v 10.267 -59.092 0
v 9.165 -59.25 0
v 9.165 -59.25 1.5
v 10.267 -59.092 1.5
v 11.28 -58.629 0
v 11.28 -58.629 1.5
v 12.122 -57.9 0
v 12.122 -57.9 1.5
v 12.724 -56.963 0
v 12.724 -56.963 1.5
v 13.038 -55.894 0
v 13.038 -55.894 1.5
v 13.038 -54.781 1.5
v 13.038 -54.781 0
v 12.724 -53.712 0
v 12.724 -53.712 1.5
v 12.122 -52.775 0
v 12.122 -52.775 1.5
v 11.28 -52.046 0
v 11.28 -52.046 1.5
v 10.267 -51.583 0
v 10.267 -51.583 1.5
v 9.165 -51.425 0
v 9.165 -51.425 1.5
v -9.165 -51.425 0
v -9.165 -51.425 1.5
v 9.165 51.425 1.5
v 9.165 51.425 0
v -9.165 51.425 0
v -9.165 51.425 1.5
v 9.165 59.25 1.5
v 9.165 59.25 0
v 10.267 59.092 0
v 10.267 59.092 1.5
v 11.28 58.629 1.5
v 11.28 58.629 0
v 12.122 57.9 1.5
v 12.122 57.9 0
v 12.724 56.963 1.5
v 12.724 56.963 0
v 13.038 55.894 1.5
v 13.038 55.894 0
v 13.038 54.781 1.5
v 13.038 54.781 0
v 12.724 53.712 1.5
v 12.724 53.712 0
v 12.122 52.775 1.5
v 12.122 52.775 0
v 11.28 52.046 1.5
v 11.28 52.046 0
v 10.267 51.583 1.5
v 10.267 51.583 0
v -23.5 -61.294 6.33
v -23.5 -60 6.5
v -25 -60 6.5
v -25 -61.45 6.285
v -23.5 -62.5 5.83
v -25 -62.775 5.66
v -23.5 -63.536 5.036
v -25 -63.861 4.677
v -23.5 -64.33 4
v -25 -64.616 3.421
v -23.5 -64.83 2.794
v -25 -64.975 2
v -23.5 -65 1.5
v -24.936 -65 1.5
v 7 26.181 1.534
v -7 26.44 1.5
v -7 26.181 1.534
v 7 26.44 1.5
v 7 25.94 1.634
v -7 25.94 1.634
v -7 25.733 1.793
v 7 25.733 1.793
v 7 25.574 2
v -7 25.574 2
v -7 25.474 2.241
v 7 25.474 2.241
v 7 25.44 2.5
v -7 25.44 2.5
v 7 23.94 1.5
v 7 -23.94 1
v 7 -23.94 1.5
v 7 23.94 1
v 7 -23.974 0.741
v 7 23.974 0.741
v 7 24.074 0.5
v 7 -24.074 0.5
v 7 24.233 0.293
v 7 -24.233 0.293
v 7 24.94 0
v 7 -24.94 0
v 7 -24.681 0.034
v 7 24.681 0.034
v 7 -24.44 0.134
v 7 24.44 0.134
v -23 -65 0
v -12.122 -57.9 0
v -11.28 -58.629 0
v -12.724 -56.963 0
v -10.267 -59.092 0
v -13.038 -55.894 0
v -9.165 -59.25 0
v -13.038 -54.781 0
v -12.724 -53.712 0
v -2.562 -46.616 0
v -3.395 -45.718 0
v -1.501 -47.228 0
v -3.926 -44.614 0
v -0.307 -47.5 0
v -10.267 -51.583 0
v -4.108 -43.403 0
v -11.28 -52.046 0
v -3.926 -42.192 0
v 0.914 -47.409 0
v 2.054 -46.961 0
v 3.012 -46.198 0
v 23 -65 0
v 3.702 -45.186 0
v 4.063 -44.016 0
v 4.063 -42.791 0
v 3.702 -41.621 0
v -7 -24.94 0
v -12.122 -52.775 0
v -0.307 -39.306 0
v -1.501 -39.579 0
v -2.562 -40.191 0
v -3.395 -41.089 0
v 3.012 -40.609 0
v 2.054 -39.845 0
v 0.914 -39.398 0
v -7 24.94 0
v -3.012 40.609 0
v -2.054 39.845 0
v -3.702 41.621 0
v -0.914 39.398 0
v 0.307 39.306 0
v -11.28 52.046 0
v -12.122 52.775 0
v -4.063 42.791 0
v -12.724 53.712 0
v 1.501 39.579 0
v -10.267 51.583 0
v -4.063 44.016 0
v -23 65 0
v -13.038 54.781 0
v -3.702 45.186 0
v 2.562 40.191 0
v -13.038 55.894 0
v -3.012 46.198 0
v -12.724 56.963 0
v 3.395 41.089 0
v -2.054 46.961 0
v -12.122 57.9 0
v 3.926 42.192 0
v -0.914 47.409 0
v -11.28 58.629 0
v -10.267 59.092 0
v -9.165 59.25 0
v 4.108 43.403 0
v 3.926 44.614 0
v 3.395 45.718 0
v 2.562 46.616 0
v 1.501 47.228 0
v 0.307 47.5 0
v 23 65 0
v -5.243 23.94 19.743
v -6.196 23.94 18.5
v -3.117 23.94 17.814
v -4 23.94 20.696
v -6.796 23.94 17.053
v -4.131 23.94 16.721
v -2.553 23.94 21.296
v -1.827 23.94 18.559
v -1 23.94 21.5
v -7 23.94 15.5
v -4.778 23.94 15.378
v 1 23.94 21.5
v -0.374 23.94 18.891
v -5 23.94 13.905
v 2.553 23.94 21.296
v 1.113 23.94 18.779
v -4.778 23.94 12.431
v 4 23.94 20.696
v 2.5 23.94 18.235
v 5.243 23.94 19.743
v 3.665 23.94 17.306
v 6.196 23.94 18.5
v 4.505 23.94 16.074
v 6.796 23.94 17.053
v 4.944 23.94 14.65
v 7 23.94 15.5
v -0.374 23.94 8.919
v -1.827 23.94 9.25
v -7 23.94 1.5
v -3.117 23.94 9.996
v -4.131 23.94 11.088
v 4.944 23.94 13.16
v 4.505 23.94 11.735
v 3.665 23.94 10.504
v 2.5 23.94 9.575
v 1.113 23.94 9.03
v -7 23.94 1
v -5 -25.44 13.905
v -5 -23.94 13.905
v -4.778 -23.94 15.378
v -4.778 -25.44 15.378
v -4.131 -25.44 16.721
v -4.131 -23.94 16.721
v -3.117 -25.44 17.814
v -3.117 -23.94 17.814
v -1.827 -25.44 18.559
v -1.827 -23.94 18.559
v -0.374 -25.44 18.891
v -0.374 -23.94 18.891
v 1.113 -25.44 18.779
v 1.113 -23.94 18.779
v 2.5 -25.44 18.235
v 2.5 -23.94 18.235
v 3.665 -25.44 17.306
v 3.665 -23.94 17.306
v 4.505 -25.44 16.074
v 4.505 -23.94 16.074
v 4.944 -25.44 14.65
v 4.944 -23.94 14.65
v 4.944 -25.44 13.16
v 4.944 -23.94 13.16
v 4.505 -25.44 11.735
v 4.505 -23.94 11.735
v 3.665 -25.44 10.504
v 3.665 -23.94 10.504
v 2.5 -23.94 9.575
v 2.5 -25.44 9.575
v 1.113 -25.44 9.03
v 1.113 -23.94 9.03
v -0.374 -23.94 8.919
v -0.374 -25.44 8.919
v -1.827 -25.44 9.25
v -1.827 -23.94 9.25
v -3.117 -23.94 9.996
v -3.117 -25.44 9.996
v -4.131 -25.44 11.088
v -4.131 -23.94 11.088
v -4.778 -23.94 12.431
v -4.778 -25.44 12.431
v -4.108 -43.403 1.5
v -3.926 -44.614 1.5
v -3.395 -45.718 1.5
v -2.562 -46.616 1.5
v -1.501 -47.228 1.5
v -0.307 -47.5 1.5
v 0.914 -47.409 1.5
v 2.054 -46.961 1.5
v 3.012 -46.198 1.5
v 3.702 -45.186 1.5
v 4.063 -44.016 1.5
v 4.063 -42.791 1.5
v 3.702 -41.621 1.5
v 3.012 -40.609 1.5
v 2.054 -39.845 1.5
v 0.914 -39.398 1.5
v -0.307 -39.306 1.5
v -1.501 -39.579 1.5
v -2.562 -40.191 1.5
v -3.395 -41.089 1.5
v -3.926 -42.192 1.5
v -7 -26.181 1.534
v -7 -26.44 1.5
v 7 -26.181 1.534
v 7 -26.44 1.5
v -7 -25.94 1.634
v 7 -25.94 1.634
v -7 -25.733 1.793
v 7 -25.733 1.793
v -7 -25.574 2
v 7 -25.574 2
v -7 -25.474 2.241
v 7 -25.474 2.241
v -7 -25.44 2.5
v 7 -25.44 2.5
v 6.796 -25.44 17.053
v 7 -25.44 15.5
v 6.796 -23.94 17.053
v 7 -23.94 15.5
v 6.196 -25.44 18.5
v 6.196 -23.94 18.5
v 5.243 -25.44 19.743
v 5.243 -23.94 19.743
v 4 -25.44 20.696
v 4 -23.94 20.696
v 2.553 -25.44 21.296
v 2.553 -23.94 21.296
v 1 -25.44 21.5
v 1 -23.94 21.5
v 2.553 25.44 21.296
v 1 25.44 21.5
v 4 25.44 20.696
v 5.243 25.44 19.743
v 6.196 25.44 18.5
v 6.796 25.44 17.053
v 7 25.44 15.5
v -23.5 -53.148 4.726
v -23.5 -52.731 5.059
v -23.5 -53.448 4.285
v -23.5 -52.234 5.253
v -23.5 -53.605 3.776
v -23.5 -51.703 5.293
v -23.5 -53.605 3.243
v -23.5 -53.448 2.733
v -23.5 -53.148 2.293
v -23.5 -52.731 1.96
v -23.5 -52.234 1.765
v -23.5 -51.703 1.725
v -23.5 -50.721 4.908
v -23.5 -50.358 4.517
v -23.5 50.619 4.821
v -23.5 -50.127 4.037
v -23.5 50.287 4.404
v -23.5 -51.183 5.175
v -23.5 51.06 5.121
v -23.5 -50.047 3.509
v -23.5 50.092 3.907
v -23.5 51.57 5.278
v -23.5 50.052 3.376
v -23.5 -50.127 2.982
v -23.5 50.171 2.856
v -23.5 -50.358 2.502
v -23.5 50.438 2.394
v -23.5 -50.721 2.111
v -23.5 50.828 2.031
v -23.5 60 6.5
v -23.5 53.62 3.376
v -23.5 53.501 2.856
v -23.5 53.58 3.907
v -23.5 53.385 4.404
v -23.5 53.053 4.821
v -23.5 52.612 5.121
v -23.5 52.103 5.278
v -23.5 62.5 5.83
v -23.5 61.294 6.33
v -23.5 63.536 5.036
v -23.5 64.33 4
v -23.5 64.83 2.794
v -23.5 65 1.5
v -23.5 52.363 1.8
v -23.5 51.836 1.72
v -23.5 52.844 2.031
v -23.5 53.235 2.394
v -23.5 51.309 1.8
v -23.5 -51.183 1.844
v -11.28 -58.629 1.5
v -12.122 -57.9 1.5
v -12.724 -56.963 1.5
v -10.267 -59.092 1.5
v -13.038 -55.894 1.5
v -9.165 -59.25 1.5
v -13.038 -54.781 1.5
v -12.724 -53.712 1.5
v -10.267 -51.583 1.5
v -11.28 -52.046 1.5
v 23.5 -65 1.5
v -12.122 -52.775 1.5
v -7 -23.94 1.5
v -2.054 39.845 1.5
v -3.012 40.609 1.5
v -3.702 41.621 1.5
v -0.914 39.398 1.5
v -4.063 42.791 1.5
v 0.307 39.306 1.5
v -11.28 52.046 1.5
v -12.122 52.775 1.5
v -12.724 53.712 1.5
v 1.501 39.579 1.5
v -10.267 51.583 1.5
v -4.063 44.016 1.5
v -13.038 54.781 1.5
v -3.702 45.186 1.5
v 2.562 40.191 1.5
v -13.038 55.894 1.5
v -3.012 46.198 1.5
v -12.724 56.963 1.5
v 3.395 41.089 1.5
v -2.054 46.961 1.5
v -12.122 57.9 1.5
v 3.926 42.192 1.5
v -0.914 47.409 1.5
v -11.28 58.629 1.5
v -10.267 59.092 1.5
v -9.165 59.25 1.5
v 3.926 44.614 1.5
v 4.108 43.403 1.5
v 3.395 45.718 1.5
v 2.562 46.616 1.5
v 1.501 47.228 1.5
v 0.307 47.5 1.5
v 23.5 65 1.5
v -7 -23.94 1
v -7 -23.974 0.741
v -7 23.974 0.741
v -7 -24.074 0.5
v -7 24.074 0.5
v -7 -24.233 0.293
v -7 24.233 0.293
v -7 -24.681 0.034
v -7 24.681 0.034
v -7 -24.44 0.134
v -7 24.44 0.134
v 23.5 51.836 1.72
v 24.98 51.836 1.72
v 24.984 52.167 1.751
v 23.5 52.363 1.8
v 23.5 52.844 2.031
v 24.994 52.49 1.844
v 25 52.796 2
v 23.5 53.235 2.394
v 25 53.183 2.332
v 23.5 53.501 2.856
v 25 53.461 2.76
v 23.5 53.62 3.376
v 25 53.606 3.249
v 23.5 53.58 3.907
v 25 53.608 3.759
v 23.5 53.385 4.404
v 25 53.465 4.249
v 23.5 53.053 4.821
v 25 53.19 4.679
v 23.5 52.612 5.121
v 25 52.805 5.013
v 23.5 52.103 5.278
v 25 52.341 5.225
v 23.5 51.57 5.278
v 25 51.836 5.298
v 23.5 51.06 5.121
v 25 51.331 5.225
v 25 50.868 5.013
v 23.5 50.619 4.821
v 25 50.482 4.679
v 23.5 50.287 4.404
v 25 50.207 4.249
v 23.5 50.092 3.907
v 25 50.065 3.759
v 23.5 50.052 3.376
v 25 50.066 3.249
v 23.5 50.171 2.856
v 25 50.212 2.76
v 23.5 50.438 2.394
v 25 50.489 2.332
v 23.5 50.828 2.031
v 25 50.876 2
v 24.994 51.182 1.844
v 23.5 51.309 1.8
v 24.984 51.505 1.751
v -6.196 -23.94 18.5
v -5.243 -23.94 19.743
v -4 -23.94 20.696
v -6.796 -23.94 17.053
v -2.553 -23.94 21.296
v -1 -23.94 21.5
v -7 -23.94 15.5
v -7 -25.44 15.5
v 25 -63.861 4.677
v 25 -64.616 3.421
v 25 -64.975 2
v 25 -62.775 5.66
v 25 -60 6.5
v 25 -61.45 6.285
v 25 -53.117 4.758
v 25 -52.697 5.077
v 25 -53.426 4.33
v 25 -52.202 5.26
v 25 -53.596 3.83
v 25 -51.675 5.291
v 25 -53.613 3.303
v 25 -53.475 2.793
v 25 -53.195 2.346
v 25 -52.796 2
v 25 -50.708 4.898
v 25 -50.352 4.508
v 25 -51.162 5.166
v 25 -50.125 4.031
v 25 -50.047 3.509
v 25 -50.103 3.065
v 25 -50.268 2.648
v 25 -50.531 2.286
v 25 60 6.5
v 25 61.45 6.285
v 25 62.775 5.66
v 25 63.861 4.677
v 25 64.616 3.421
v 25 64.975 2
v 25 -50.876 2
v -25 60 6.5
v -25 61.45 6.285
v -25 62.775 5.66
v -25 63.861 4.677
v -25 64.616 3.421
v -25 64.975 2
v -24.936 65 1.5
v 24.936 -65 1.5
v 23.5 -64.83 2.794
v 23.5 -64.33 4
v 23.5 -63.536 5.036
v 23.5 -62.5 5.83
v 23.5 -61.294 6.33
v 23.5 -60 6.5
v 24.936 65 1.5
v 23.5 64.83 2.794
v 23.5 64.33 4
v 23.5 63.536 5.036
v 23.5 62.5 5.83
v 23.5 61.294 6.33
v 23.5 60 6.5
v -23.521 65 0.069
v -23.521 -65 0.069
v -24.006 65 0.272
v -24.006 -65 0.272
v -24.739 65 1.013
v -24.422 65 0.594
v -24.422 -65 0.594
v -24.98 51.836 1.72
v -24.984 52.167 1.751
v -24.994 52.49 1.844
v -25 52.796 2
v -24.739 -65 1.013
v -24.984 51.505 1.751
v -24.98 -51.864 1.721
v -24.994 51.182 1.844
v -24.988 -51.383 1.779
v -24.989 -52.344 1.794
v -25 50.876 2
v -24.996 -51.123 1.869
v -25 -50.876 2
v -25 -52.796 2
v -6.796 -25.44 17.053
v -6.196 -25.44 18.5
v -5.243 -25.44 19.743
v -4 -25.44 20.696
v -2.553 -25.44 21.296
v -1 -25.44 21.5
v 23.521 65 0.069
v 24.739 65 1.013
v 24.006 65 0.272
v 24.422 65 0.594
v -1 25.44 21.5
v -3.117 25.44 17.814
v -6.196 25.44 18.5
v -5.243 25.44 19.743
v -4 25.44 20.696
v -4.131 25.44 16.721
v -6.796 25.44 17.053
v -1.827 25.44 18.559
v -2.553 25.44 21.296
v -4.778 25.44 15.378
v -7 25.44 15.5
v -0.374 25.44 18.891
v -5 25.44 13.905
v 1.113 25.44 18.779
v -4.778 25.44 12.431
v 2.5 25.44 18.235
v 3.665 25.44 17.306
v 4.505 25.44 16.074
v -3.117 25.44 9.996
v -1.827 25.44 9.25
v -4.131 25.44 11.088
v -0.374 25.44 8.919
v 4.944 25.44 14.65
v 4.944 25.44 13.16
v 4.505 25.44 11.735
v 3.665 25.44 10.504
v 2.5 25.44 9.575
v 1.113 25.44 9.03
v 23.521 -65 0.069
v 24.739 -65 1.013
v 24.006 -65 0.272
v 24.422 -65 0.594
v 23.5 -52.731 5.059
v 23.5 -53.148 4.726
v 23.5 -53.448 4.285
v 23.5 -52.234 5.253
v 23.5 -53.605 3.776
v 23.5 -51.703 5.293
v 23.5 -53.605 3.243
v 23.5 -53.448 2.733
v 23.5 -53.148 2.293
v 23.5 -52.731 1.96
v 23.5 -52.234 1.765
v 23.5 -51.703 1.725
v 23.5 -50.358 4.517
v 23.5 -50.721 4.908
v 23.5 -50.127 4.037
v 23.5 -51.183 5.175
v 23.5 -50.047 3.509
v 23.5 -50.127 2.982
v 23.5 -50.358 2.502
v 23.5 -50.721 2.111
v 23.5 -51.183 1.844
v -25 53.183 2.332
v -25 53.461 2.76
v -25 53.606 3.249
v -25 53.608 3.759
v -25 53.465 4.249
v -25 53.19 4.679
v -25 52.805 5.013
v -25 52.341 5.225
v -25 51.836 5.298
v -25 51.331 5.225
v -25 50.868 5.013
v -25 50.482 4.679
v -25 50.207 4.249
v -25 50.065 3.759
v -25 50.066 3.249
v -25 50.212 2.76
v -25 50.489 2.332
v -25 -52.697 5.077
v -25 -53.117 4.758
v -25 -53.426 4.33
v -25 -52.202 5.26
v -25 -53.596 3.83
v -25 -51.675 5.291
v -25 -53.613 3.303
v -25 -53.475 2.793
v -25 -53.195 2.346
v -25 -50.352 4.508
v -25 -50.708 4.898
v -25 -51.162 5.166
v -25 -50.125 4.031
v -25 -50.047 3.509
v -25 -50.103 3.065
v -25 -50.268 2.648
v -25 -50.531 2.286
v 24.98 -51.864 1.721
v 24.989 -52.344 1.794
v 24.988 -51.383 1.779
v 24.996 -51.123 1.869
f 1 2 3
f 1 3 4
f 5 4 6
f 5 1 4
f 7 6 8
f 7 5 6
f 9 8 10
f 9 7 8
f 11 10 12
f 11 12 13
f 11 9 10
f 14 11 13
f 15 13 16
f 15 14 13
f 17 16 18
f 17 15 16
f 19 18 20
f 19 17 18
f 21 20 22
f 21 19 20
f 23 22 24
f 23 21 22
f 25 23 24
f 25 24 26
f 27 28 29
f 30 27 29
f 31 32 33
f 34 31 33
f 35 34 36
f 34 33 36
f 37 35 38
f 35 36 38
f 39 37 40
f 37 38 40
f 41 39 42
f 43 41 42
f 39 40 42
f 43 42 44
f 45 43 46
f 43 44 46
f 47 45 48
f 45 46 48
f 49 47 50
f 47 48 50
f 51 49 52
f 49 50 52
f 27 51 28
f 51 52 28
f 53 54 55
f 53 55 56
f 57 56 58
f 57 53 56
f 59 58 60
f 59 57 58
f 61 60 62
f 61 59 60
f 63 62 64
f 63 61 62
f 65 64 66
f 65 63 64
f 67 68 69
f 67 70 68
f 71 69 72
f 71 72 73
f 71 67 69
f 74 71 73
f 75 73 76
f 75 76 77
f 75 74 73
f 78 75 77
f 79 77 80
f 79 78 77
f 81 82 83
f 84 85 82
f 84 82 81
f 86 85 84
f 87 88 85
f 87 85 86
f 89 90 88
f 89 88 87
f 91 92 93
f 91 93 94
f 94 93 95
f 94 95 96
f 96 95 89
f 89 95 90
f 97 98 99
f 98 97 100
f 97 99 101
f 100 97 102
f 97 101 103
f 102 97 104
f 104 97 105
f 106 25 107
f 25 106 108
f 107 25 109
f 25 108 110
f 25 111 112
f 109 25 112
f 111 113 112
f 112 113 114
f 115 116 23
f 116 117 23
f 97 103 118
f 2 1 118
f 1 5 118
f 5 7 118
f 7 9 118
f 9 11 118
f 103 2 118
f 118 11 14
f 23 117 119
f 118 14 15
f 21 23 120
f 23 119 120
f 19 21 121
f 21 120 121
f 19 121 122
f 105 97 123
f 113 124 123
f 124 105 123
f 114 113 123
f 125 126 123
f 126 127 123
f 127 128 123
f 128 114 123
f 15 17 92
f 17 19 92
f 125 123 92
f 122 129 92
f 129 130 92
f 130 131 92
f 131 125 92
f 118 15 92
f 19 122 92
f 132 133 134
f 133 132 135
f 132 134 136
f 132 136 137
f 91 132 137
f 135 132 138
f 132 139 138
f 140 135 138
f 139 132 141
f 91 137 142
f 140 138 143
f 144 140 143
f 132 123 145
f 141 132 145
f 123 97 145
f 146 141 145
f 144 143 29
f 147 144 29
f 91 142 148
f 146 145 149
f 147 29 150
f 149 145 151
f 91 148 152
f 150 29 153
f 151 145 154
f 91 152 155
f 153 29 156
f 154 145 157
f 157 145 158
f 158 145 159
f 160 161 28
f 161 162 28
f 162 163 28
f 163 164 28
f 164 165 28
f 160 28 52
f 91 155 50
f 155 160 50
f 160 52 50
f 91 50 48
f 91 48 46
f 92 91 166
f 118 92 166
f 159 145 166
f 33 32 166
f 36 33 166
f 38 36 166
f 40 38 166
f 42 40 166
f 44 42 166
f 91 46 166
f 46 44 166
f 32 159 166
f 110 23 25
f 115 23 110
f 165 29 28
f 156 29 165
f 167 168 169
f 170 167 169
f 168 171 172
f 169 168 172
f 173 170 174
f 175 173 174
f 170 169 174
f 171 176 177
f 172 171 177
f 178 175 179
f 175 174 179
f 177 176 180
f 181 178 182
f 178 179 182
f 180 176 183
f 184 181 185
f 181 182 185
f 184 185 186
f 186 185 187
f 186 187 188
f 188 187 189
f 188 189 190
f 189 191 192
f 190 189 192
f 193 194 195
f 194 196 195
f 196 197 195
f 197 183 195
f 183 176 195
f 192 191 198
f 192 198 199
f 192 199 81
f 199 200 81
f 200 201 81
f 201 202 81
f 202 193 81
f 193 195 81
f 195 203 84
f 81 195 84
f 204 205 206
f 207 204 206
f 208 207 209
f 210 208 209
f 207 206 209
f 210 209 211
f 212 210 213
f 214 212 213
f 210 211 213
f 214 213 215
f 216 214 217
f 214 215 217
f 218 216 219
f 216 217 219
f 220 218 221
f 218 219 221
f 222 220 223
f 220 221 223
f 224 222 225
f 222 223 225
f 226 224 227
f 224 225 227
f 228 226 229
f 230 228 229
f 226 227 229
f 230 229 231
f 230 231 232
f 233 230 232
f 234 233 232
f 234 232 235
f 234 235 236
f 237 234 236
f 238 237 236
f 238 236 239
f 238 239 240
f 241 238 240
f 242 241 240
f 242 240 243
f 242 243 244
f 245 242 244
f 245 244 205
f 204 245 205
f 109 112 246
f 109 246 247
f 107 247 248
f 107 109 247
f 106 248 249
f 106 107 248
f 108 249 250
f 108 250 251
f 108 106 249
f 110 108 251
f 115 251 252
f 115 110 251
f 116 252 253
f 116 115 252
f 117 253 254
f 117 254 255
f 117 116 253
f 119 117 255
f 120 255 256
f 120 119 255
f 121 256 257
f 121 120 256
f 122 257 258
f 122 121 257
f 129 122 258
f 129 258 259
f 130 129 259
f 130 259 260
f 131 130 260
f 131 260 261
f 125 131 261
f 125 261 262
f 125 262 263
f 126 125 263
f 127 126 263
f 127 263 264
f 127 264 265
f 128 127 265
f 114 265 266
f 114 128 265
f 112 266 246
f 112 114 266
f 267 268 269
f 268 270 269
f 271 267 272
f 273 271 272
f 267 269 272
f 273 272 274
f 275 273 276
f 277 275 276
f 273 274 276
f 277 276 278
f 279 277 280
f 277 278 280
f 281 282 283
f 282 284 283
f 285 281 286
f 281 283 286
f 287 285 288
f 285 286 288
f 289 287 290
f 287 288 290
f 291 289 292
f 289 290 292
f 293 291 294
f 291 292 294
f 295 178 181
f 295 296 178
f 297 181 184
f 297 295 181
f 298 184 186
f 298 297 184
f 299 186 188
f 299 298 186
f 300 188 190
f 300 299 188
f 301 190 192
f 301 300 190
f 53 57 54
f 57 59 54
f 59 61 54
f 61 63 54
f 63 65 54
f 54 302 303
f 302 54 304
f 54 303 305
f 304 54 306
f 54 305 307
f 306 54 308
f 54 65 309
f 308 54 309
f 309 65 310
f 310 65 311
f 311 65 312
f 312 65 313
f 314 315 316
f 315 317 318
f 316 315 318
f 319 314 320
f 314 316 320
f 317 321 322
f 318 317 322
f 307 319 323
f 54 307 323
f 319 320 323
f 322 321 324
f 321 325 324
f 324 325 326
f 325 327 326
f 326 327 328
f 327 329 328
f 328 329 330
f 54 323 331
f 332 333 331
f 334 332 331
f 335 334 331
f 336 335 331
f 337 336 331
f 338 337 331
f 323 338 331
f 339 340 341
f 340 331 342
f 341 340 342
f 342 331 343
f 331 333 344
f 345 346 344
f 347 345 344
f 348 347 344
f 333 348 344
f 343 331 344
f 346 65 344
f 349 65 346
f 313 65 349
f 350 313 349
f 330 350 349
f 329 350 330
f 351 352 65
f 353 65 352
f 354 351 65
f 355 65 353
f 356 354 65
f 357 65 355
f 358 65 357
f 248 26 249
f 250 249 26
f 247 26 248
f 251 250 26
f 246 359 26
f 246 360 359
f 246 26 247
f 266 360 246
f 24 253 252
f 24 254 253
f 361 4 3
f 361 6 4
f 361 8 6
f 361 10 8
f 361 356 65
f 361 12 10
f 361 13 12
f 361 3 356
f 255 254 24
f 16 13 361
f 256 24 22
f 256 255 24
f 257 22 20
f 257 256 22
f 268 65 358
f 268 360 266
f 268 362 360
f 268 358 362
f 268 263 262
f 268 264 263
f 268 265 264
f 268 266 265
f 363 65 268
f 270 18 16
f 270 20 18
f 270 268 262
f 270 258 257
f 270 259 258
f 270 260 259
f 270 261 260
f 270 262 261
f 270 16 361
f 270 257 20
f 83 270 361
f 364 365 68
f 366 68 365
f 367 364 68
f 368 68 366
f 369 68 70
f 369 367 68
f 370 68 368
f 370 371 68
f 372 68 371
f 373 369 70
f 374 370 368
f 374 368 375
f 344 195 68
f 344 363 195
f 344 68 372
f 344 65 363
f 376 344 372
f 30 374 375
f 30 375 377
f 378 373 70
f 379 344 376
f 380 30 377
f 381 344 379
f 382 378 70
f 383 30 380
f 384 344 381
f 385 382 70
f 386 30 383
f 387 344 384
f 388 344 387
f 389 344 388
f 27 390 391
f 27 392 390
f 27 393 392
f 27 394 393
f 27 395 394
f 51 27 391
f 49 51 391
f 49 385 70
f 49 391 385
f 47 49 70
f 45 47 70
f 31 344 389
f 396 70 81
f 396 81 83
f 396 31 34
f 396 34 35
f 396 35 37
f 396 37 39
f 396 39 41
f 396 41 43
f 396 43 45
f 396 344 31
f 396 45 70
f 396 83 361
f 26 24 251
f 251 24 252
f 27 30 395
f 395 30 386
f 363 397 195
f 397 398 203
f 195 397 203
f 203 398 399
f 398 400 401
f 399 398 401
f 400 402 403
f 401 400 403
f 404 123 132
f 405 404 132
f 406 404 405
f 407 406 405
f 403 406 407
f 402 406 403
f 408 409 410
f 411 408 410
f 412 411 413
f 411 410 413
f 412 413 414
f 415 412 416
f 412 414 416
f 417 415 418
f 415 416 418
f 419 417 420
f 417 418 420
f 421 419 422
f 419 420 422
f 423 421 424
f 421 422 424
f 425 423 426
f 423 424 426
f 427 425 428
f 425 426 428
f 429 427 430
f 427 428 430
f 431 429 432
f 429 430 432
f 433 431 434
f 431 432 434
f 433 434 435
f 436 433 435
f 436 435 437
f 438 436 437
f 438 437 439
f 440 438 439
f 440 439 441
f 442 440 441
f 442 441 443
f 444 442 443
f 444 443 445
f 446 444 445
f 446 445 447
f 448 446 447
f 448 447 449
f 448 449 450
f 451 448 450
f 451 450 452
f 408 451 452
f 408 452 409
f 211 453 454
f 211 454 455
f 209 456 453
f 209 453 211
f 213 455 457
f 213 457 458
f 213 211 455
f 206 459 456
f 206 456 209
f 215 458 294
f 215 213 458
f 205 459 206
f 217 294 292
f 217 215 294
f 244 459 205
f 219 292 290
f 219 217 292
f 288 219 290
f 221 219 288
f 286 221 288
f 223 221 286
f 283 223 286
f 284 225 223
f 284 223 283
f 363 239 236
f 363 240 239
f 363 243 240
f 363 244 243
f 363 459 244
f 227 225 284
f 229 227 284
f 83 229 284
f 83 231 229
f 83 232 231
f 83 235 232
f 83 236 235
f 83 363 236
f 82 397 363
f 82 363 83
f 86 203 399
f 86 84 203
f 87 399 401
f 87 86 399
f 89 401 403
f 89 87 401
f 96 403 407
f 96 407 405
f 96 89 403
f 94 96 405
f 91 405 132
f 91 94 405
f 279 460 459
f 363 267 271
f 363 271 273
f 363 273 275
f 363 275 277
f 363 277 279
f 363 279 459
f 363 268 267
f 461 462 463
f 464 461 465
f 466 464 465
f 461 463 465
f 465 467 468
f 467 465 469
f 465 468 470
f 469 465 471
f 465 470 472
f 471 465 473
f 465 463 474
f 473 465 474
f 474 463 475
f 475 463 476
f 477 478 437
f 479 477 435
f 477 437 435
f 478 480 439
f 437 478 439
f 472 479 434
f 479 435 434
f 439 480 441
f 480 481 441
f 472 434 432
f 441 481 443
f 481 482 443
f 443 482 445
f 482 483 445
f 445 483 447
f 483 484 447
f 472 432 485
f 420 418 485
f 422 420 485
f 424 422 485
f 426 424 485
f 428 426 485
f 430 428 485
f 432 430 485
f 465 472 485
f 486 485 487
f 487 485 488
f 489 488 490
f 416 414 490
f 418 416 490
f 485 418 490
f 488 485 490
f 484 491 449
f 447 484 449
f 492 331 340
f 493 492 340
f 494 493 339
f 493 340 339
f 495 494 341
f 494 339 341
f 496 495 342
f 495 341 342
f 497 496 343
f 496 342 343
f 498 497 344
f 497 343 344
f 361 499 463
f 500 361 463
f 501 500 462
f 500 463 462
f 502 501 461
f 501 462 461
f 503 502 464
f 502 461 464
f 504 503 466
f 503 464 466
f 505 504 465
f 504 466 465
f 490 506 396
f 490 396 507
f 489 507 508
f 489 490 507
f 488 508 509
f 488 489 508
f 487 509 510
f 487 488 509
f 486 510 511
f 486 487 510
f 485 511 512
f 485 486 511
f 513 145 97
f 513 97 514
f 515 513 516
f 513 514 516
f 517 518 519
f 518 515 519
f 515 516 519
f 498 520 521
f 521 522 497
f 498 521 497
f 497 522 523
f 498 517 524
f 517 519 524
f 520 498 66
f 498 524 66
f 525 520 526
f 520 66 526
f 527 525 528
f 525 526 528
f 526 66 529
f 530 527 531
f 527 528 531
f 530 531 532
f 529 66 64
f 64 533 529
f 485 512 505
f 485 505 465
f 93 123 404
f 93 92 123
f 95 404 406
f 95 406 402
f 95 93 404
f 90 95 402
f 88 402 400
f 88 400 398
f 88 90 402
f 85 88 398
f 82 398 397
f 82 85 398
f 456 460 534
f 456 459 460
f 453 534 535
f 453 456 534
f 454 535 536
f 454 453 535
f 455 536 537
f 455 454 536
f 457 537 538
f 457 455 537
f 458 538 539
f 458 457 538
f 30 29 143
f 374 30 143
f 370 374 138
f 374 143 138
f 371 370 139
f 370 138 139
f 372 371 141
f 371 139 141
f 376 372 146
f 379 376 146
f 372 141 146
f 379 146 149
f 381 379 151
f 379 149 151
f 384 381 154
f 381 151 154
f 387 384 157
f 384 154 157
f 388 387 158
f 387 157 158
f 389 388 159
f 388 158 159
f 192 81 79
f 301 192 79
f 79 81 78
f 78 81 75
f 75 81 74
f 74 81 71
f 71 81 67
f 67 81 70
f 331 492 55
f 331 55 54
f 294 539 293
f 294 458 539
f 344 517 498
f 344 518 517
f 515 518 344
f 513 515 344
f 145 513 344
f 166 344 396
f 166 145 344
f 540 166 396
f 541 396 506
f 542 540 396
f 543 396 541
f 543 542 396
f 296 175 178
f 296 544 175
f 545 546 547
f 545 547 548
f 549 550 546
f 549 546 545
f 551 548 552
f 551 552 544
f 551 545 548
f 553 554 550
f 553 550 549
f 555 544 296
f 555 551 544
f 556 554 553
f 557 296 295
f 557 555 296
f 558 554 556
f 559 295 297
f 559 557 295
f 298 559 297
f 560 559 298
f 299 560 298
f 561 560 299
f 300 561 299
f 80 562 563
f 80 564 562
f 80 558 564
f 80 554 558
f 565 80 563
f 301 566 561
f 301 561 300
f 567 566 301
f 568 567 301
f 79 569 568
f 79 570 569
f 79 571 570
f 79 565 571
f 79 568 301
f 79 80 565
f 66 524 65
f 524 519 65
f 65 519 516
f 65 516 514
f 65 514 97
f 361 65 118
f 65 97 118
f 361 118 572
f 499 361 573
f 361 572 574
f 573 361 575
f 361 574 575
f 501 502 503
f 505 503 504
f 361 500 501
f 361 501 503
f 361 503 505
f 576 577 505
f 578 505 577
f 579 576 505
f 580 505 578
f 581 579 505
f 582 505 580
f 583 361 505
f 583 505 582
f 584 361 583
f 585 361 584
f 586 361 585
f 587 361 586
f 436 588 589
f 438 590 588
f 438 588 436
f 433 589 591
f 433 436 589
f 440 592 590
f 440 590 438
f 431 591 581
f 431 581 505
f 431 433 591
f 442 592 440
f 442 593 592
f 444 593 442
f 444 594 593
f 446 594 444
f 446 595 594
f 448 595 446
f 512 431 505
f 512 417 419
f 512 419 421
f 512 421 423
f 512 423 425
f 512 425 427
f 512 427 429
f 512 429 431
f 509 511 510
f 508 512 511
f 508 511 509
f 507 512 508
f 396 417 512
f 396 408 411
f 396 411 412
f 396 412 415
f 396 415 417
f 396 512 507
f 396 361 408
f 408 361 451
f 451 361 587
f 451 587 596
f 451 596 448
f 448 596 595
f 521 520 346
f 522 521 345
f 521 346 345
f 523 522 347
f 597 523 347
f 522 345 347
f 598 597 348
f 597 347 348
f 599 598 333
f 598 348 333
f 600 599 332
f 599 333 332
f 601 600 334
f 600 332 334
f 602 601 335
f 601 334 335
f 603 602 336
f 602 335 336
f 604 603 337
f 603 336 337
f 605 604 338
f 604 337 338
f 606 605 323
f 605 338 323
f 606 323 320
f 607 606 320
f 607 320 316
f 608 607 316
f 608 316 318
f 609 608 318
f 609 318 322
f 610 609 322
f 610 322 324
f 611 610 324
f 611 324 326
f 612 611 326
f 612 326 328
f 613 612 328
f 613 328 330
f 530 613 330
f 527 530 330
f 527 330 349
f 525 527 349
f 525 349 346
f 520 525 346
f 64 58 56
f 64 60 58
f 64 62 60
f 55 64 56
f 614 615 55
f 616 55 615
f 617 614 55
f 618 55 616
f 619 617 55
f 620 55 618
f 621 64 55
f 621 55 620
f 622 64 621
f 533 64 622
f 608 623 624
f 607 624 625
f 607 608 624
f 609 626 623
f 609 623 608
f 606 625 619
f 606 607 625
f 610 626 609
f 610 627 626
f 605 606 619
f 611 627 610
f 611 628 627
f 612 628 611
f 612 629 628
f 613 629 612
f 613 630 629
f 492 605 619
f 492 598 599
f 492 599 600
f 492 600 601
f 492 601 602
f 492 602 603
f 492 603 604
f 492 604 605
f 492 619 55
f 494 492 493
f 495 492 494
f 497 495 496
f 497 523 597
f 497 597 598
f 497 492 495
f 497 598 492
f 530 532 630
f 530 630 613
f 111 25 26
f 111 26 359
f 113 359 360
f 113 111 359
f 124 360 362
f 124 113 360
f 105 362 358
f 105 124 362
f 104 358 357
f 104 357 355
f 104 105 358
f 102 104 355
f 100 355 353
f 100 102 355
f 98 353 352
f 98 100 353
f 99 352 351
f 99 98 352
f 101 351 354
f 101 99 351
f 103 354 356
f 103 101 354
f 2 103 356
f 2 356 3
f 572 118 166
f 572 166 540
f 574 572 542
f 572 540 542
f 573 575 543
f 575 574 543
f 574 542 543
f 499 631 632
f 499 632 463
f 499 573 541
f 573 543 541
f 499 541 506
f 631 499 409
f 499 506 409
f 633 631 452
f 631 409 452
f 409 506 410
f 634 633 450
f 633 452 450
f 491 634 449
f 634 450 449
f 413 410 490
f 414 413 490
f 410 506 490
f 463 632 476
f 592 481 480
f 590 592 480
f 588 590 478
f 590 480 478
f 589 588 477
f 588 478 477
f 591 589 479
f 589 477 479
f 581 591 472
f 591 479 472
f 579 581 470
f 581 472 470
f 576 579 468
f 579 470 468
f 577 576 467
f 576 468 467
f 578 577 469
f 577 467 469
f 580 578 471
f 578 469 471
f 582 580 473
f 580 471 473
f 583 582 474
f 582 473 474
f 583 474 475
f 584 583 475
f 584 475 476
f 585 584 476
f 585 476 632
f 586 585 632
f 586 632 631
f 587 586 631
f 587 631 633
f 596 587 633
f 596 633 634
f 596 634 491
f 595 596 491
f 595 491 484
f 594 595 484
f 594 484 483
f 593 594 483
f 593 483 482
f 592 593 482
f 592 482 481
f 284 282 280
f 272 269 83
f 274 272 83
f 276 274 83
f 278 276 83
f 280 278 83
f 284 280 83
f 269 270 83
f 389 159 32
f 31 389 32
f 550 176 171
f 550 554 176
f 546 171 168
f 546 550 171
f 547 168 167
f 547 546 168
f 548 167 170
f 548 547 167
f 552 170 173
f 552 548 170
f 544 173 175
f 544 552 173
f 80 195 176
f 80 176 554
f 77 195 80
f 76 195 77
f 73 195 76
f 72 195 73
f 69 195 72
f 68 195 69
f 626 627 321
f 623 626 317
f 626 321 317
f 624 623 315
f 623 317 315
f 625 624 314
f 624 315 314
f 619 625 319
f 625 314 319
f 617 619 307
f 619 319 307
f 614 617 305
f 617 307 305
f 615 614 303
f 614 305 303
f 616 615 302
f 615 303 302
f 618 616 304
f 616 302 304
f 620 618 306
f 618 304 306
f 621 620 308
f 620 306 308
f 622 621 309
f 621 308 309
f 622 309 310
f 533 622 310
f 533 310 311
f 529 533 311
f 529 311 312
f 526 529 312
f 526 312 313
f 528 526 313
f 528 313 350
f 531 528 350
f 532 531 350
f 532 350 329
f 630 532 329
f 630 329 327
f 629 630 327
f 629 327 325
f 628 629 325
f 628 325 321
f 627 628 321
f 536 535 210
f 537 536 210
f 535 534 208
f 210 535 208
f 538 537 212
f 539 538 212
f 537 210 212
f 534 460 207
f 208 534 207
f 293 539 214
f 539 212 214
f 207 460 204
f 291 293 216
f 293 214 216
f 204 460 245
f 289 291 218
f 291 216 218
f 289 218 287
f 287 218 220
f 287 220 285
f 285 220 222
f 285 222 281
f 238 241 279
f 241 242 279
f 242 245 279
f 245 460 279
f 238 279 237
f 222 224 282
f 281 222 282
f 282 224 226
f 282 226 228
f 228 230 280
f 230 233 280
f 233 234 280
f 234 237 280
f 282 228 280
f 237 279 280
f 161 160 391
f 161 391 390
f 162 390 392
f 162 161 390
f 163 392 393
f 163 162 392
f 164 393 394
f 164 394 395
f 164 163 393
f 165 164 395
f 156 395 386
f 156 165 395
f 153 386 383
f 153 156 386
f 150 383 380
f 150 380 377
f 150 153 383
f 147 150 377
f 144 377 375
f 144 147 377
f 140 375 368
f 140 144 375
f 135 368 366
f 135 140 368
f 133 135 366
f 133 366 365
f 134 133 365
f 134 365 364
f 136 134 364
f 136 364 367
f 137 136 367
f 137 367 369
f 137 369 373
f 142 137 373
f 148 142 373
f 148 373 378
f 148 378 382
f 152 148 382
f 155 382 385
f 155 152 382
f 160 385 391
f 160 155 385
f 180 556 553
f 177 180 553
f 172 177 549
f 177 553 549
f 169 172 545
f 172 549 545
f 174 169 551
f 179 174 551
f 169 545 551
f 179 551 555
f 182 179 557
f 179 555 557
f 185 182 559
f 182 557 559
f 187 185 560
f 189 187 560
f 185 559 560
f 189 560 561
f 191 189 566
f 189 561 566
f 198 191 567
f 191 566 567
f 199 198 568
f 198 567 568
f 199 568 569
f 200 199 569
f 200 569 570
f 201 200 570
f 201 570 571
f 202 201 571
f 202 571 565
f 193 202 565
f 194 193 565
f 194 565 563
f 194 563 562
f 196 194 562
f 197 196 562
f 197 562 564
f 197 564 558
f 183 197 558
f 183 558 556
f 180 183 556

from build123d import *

# Parameters (mm, degrees)
SKETCH1_W           = 50
SKETCH1_H           = 130
SKETCH1_R           = 4.108488497
SKETCH1_W_2         = 14
SKETCH1_H_2         = 47.88
BOSS_EXTRUDE1_DEPTH = 1.5
SKETCH2_W           = 1.5
SKETCH2_H           = 130
BOSS_EXTRUDE2_DEPTH = 5
SKETCH3_R           = 1.78890387
CUT_EXTRUDE1_DEPTH  = 83.263296798
FILLET1_R           = 5
FILLET2_R           = 2
SKETCH4_W           = 14
SKETCH4_H           = 1.5
BOSS_EXTRUDE3_DEPTH = 20
FILLET3_R           = 6
FILLET4_R           = 1
SKETCH5_R           = 5
CUT_EXTRUDE2_DEPTH  = 97.263407498


with BuildPart() as part:
    # Sketch1 → Boss-Extrude1 (new body)
    with BuildSketch(Plane.XY):
        Rectangle(SKETCH1_W, SKETCH1_H)
        with Locations((0, 43.4034135)):
            Circle(SKETCH1_R, mode=Mode.SUBTRACT)
        with Locations(Location((0, -43.4034135, 0), (0, 0, 180))):
            Circle(SKETCH1_R, mode=Mode.SUBTRACT)
        Rectangle(SKETCH1_W_2, SKETCH1_H_2, mode=Mode.SUBTRACT)
        with BuildLine():
            Line((9.165030278, 51.424748184), (-9.165030278, 51.424748184))
            ThreePointArc((-9.165030278, 51.424748184), (-13.077876466, 55.337594372), (-9.165030278, 59.250440559))
            Line((-9.165030278, 59.250440559), (9.165030278, 59.250440559))
            ThreePointArc((9.165030278, 59.250440559), (13.077876466, 55.337594372), (9.165030278, 51.424748184))
        make_face(mode=Mode.SUBTRACT)
        with BuildLine():
            Line((9.165030278, -51.424748184), (-9.165030278, -51.424748184))
            ThreePointArc((-9.165030278, -51.424748184), (-13.077876466, -55.337594372), (-9.165030278, -59.250440559))
            Line((-9.165030278, -59.250440559), (9.165030278, -59.250440559))
            ThreePointArc((9.165030278, -59.250440559), (13.077876466, -55.337594372), (9.165030278, -51.424748184))
        make_face(mode=Mode.SUBTRACT)
    extrude(amount=BOSS_EXTRUDE1_DEPTH)

    # Sketch2 → Boss-Extrude2 (add)
    with BuildSketch(Plane.XY.offset(1.5)):
        with Locations((-24.25, 0)):
            Rectangle(SKETCH2_W, SKETCH2_H)
        with Locations((24.25, 0)):
            Rectangle(SKETCH2_W, SKETCH2_H)
    extrude(amount=BOSS_EXTRUDE2_DEPTH)

    # Sketch3 → Cut-Extrude1 (cut, through all)
    with BuildSketch(Plane(origin=(25, 0, 0), x_dir=(0, 0, -1), z_dir=(1, 0, 0))):
        with Locations((-3.509314499, 51.836194759)):
            Circle(SKETCH3_R)
        with Locations(Location((-3.509314499, -51.836194759, 0), (0, 0, 90))):
            Circle(SKETCH3_R)
    extrude(amount=-CUT_EXTRUDE1_DEPTH, mode=Mode.SUBTRACT)

    # Fillet1
    fillet1_edges = [part.edges().sort_by_distance(p)[0] for p in [
        (-24.25, -65, 6.5),
        (24.25, -65, 6.5),
        (24.25, 65, 6.5),
        (-24.25, 65, 6.5),
    ]]
    fillet(fillet1_edges, radius=FILLET1_R)

    # Fillet2
    # the kernel refuses this fillet: 2 mm, written as the material it takes off along each edge
    with BuildSketch(Plane(origin=(25, 70, 0), x_dir=(0, 0, 1), z_dir=(0, -1, 0))) as fillet2_piece_1:
        with BuildLine():
            CenterArc((FILLET2_R, FILLET2_R), FILLET2_R, 180, 90)
            Line((0, FILLET2_R), (0, 0))
            Line((0, 0), (FILLET2_R, 0))
        make_face()
    extrude(amount=140, mode=Mode.SUBTRACT)
    with BuildSketch(Plane(origin=(-25, -70, 0), x_dir=(1, 0, 0), z_dir=(0, 1, 0))) as fillet2_piece_2:
        with BuildLine():
            CenterArc((FILLET2_R, -FILLET2_R), FILLET2_R, 90, 90)
            Line((0, -FILLET2_R), (0, 0))
            Line((0, 0), (FILLET2_R, 0))
        make_face()
    extrude(amount=140, mode=Mode.SUBTRACT)

    # Sketch4 → Boss-Extrude3 (add)
    with BuildSketch(Plane.XY.offset(1.5)):
        with Locations((0, 24.69)):
            Rectangle(SKETCH4_W, SKETCH4_H)
        with Locations((0, -24.69)):
            Rectangle(SKETCH4_W, SKETCH4_H)
    extrude(amount=BOSS_EXTRUDE3_DEPTH)

    # Fillet3
    fillet3_edges = [part.edges().sort_by_distance(p)[0] for p in [
        (7, 24.69, 21.5),
        (-7, 24.69, 21.5),
        (-7, -24.69, 21.5),
        (7, -24.69, 21.5),
    ]]
    fillet(fillet3_edges, radius=FILLET3_R)

    # Fillet4
    fillet4_edges = [part.edges().sort_by_distance(p)[0] for p in [
        (0, -23.94, 0),
        (0, 23.94, 0),
        (0, 25.44, 1.5),
        (0, -25.44, 1.5),
    ]]
    fillet(fillet4_edges, radius=FILLET4_R)

    # Sketch5 → Cut-Extrude2 (cut, through all)
    with BuildSketch(Plane(origin=(0, 25.44, 0), x_dir=(1, 0, 0), z_dir=(0, 1, 0))):
        with Locations(Location((0, -13.904712179, 0), (0, 0, 180))):
            Circle(SKETCH5_R)
    extrude(amount=-CUT_EXTRUDE2_DEPTH, mode=Mode.SUBTRACT)


solid = part.part
